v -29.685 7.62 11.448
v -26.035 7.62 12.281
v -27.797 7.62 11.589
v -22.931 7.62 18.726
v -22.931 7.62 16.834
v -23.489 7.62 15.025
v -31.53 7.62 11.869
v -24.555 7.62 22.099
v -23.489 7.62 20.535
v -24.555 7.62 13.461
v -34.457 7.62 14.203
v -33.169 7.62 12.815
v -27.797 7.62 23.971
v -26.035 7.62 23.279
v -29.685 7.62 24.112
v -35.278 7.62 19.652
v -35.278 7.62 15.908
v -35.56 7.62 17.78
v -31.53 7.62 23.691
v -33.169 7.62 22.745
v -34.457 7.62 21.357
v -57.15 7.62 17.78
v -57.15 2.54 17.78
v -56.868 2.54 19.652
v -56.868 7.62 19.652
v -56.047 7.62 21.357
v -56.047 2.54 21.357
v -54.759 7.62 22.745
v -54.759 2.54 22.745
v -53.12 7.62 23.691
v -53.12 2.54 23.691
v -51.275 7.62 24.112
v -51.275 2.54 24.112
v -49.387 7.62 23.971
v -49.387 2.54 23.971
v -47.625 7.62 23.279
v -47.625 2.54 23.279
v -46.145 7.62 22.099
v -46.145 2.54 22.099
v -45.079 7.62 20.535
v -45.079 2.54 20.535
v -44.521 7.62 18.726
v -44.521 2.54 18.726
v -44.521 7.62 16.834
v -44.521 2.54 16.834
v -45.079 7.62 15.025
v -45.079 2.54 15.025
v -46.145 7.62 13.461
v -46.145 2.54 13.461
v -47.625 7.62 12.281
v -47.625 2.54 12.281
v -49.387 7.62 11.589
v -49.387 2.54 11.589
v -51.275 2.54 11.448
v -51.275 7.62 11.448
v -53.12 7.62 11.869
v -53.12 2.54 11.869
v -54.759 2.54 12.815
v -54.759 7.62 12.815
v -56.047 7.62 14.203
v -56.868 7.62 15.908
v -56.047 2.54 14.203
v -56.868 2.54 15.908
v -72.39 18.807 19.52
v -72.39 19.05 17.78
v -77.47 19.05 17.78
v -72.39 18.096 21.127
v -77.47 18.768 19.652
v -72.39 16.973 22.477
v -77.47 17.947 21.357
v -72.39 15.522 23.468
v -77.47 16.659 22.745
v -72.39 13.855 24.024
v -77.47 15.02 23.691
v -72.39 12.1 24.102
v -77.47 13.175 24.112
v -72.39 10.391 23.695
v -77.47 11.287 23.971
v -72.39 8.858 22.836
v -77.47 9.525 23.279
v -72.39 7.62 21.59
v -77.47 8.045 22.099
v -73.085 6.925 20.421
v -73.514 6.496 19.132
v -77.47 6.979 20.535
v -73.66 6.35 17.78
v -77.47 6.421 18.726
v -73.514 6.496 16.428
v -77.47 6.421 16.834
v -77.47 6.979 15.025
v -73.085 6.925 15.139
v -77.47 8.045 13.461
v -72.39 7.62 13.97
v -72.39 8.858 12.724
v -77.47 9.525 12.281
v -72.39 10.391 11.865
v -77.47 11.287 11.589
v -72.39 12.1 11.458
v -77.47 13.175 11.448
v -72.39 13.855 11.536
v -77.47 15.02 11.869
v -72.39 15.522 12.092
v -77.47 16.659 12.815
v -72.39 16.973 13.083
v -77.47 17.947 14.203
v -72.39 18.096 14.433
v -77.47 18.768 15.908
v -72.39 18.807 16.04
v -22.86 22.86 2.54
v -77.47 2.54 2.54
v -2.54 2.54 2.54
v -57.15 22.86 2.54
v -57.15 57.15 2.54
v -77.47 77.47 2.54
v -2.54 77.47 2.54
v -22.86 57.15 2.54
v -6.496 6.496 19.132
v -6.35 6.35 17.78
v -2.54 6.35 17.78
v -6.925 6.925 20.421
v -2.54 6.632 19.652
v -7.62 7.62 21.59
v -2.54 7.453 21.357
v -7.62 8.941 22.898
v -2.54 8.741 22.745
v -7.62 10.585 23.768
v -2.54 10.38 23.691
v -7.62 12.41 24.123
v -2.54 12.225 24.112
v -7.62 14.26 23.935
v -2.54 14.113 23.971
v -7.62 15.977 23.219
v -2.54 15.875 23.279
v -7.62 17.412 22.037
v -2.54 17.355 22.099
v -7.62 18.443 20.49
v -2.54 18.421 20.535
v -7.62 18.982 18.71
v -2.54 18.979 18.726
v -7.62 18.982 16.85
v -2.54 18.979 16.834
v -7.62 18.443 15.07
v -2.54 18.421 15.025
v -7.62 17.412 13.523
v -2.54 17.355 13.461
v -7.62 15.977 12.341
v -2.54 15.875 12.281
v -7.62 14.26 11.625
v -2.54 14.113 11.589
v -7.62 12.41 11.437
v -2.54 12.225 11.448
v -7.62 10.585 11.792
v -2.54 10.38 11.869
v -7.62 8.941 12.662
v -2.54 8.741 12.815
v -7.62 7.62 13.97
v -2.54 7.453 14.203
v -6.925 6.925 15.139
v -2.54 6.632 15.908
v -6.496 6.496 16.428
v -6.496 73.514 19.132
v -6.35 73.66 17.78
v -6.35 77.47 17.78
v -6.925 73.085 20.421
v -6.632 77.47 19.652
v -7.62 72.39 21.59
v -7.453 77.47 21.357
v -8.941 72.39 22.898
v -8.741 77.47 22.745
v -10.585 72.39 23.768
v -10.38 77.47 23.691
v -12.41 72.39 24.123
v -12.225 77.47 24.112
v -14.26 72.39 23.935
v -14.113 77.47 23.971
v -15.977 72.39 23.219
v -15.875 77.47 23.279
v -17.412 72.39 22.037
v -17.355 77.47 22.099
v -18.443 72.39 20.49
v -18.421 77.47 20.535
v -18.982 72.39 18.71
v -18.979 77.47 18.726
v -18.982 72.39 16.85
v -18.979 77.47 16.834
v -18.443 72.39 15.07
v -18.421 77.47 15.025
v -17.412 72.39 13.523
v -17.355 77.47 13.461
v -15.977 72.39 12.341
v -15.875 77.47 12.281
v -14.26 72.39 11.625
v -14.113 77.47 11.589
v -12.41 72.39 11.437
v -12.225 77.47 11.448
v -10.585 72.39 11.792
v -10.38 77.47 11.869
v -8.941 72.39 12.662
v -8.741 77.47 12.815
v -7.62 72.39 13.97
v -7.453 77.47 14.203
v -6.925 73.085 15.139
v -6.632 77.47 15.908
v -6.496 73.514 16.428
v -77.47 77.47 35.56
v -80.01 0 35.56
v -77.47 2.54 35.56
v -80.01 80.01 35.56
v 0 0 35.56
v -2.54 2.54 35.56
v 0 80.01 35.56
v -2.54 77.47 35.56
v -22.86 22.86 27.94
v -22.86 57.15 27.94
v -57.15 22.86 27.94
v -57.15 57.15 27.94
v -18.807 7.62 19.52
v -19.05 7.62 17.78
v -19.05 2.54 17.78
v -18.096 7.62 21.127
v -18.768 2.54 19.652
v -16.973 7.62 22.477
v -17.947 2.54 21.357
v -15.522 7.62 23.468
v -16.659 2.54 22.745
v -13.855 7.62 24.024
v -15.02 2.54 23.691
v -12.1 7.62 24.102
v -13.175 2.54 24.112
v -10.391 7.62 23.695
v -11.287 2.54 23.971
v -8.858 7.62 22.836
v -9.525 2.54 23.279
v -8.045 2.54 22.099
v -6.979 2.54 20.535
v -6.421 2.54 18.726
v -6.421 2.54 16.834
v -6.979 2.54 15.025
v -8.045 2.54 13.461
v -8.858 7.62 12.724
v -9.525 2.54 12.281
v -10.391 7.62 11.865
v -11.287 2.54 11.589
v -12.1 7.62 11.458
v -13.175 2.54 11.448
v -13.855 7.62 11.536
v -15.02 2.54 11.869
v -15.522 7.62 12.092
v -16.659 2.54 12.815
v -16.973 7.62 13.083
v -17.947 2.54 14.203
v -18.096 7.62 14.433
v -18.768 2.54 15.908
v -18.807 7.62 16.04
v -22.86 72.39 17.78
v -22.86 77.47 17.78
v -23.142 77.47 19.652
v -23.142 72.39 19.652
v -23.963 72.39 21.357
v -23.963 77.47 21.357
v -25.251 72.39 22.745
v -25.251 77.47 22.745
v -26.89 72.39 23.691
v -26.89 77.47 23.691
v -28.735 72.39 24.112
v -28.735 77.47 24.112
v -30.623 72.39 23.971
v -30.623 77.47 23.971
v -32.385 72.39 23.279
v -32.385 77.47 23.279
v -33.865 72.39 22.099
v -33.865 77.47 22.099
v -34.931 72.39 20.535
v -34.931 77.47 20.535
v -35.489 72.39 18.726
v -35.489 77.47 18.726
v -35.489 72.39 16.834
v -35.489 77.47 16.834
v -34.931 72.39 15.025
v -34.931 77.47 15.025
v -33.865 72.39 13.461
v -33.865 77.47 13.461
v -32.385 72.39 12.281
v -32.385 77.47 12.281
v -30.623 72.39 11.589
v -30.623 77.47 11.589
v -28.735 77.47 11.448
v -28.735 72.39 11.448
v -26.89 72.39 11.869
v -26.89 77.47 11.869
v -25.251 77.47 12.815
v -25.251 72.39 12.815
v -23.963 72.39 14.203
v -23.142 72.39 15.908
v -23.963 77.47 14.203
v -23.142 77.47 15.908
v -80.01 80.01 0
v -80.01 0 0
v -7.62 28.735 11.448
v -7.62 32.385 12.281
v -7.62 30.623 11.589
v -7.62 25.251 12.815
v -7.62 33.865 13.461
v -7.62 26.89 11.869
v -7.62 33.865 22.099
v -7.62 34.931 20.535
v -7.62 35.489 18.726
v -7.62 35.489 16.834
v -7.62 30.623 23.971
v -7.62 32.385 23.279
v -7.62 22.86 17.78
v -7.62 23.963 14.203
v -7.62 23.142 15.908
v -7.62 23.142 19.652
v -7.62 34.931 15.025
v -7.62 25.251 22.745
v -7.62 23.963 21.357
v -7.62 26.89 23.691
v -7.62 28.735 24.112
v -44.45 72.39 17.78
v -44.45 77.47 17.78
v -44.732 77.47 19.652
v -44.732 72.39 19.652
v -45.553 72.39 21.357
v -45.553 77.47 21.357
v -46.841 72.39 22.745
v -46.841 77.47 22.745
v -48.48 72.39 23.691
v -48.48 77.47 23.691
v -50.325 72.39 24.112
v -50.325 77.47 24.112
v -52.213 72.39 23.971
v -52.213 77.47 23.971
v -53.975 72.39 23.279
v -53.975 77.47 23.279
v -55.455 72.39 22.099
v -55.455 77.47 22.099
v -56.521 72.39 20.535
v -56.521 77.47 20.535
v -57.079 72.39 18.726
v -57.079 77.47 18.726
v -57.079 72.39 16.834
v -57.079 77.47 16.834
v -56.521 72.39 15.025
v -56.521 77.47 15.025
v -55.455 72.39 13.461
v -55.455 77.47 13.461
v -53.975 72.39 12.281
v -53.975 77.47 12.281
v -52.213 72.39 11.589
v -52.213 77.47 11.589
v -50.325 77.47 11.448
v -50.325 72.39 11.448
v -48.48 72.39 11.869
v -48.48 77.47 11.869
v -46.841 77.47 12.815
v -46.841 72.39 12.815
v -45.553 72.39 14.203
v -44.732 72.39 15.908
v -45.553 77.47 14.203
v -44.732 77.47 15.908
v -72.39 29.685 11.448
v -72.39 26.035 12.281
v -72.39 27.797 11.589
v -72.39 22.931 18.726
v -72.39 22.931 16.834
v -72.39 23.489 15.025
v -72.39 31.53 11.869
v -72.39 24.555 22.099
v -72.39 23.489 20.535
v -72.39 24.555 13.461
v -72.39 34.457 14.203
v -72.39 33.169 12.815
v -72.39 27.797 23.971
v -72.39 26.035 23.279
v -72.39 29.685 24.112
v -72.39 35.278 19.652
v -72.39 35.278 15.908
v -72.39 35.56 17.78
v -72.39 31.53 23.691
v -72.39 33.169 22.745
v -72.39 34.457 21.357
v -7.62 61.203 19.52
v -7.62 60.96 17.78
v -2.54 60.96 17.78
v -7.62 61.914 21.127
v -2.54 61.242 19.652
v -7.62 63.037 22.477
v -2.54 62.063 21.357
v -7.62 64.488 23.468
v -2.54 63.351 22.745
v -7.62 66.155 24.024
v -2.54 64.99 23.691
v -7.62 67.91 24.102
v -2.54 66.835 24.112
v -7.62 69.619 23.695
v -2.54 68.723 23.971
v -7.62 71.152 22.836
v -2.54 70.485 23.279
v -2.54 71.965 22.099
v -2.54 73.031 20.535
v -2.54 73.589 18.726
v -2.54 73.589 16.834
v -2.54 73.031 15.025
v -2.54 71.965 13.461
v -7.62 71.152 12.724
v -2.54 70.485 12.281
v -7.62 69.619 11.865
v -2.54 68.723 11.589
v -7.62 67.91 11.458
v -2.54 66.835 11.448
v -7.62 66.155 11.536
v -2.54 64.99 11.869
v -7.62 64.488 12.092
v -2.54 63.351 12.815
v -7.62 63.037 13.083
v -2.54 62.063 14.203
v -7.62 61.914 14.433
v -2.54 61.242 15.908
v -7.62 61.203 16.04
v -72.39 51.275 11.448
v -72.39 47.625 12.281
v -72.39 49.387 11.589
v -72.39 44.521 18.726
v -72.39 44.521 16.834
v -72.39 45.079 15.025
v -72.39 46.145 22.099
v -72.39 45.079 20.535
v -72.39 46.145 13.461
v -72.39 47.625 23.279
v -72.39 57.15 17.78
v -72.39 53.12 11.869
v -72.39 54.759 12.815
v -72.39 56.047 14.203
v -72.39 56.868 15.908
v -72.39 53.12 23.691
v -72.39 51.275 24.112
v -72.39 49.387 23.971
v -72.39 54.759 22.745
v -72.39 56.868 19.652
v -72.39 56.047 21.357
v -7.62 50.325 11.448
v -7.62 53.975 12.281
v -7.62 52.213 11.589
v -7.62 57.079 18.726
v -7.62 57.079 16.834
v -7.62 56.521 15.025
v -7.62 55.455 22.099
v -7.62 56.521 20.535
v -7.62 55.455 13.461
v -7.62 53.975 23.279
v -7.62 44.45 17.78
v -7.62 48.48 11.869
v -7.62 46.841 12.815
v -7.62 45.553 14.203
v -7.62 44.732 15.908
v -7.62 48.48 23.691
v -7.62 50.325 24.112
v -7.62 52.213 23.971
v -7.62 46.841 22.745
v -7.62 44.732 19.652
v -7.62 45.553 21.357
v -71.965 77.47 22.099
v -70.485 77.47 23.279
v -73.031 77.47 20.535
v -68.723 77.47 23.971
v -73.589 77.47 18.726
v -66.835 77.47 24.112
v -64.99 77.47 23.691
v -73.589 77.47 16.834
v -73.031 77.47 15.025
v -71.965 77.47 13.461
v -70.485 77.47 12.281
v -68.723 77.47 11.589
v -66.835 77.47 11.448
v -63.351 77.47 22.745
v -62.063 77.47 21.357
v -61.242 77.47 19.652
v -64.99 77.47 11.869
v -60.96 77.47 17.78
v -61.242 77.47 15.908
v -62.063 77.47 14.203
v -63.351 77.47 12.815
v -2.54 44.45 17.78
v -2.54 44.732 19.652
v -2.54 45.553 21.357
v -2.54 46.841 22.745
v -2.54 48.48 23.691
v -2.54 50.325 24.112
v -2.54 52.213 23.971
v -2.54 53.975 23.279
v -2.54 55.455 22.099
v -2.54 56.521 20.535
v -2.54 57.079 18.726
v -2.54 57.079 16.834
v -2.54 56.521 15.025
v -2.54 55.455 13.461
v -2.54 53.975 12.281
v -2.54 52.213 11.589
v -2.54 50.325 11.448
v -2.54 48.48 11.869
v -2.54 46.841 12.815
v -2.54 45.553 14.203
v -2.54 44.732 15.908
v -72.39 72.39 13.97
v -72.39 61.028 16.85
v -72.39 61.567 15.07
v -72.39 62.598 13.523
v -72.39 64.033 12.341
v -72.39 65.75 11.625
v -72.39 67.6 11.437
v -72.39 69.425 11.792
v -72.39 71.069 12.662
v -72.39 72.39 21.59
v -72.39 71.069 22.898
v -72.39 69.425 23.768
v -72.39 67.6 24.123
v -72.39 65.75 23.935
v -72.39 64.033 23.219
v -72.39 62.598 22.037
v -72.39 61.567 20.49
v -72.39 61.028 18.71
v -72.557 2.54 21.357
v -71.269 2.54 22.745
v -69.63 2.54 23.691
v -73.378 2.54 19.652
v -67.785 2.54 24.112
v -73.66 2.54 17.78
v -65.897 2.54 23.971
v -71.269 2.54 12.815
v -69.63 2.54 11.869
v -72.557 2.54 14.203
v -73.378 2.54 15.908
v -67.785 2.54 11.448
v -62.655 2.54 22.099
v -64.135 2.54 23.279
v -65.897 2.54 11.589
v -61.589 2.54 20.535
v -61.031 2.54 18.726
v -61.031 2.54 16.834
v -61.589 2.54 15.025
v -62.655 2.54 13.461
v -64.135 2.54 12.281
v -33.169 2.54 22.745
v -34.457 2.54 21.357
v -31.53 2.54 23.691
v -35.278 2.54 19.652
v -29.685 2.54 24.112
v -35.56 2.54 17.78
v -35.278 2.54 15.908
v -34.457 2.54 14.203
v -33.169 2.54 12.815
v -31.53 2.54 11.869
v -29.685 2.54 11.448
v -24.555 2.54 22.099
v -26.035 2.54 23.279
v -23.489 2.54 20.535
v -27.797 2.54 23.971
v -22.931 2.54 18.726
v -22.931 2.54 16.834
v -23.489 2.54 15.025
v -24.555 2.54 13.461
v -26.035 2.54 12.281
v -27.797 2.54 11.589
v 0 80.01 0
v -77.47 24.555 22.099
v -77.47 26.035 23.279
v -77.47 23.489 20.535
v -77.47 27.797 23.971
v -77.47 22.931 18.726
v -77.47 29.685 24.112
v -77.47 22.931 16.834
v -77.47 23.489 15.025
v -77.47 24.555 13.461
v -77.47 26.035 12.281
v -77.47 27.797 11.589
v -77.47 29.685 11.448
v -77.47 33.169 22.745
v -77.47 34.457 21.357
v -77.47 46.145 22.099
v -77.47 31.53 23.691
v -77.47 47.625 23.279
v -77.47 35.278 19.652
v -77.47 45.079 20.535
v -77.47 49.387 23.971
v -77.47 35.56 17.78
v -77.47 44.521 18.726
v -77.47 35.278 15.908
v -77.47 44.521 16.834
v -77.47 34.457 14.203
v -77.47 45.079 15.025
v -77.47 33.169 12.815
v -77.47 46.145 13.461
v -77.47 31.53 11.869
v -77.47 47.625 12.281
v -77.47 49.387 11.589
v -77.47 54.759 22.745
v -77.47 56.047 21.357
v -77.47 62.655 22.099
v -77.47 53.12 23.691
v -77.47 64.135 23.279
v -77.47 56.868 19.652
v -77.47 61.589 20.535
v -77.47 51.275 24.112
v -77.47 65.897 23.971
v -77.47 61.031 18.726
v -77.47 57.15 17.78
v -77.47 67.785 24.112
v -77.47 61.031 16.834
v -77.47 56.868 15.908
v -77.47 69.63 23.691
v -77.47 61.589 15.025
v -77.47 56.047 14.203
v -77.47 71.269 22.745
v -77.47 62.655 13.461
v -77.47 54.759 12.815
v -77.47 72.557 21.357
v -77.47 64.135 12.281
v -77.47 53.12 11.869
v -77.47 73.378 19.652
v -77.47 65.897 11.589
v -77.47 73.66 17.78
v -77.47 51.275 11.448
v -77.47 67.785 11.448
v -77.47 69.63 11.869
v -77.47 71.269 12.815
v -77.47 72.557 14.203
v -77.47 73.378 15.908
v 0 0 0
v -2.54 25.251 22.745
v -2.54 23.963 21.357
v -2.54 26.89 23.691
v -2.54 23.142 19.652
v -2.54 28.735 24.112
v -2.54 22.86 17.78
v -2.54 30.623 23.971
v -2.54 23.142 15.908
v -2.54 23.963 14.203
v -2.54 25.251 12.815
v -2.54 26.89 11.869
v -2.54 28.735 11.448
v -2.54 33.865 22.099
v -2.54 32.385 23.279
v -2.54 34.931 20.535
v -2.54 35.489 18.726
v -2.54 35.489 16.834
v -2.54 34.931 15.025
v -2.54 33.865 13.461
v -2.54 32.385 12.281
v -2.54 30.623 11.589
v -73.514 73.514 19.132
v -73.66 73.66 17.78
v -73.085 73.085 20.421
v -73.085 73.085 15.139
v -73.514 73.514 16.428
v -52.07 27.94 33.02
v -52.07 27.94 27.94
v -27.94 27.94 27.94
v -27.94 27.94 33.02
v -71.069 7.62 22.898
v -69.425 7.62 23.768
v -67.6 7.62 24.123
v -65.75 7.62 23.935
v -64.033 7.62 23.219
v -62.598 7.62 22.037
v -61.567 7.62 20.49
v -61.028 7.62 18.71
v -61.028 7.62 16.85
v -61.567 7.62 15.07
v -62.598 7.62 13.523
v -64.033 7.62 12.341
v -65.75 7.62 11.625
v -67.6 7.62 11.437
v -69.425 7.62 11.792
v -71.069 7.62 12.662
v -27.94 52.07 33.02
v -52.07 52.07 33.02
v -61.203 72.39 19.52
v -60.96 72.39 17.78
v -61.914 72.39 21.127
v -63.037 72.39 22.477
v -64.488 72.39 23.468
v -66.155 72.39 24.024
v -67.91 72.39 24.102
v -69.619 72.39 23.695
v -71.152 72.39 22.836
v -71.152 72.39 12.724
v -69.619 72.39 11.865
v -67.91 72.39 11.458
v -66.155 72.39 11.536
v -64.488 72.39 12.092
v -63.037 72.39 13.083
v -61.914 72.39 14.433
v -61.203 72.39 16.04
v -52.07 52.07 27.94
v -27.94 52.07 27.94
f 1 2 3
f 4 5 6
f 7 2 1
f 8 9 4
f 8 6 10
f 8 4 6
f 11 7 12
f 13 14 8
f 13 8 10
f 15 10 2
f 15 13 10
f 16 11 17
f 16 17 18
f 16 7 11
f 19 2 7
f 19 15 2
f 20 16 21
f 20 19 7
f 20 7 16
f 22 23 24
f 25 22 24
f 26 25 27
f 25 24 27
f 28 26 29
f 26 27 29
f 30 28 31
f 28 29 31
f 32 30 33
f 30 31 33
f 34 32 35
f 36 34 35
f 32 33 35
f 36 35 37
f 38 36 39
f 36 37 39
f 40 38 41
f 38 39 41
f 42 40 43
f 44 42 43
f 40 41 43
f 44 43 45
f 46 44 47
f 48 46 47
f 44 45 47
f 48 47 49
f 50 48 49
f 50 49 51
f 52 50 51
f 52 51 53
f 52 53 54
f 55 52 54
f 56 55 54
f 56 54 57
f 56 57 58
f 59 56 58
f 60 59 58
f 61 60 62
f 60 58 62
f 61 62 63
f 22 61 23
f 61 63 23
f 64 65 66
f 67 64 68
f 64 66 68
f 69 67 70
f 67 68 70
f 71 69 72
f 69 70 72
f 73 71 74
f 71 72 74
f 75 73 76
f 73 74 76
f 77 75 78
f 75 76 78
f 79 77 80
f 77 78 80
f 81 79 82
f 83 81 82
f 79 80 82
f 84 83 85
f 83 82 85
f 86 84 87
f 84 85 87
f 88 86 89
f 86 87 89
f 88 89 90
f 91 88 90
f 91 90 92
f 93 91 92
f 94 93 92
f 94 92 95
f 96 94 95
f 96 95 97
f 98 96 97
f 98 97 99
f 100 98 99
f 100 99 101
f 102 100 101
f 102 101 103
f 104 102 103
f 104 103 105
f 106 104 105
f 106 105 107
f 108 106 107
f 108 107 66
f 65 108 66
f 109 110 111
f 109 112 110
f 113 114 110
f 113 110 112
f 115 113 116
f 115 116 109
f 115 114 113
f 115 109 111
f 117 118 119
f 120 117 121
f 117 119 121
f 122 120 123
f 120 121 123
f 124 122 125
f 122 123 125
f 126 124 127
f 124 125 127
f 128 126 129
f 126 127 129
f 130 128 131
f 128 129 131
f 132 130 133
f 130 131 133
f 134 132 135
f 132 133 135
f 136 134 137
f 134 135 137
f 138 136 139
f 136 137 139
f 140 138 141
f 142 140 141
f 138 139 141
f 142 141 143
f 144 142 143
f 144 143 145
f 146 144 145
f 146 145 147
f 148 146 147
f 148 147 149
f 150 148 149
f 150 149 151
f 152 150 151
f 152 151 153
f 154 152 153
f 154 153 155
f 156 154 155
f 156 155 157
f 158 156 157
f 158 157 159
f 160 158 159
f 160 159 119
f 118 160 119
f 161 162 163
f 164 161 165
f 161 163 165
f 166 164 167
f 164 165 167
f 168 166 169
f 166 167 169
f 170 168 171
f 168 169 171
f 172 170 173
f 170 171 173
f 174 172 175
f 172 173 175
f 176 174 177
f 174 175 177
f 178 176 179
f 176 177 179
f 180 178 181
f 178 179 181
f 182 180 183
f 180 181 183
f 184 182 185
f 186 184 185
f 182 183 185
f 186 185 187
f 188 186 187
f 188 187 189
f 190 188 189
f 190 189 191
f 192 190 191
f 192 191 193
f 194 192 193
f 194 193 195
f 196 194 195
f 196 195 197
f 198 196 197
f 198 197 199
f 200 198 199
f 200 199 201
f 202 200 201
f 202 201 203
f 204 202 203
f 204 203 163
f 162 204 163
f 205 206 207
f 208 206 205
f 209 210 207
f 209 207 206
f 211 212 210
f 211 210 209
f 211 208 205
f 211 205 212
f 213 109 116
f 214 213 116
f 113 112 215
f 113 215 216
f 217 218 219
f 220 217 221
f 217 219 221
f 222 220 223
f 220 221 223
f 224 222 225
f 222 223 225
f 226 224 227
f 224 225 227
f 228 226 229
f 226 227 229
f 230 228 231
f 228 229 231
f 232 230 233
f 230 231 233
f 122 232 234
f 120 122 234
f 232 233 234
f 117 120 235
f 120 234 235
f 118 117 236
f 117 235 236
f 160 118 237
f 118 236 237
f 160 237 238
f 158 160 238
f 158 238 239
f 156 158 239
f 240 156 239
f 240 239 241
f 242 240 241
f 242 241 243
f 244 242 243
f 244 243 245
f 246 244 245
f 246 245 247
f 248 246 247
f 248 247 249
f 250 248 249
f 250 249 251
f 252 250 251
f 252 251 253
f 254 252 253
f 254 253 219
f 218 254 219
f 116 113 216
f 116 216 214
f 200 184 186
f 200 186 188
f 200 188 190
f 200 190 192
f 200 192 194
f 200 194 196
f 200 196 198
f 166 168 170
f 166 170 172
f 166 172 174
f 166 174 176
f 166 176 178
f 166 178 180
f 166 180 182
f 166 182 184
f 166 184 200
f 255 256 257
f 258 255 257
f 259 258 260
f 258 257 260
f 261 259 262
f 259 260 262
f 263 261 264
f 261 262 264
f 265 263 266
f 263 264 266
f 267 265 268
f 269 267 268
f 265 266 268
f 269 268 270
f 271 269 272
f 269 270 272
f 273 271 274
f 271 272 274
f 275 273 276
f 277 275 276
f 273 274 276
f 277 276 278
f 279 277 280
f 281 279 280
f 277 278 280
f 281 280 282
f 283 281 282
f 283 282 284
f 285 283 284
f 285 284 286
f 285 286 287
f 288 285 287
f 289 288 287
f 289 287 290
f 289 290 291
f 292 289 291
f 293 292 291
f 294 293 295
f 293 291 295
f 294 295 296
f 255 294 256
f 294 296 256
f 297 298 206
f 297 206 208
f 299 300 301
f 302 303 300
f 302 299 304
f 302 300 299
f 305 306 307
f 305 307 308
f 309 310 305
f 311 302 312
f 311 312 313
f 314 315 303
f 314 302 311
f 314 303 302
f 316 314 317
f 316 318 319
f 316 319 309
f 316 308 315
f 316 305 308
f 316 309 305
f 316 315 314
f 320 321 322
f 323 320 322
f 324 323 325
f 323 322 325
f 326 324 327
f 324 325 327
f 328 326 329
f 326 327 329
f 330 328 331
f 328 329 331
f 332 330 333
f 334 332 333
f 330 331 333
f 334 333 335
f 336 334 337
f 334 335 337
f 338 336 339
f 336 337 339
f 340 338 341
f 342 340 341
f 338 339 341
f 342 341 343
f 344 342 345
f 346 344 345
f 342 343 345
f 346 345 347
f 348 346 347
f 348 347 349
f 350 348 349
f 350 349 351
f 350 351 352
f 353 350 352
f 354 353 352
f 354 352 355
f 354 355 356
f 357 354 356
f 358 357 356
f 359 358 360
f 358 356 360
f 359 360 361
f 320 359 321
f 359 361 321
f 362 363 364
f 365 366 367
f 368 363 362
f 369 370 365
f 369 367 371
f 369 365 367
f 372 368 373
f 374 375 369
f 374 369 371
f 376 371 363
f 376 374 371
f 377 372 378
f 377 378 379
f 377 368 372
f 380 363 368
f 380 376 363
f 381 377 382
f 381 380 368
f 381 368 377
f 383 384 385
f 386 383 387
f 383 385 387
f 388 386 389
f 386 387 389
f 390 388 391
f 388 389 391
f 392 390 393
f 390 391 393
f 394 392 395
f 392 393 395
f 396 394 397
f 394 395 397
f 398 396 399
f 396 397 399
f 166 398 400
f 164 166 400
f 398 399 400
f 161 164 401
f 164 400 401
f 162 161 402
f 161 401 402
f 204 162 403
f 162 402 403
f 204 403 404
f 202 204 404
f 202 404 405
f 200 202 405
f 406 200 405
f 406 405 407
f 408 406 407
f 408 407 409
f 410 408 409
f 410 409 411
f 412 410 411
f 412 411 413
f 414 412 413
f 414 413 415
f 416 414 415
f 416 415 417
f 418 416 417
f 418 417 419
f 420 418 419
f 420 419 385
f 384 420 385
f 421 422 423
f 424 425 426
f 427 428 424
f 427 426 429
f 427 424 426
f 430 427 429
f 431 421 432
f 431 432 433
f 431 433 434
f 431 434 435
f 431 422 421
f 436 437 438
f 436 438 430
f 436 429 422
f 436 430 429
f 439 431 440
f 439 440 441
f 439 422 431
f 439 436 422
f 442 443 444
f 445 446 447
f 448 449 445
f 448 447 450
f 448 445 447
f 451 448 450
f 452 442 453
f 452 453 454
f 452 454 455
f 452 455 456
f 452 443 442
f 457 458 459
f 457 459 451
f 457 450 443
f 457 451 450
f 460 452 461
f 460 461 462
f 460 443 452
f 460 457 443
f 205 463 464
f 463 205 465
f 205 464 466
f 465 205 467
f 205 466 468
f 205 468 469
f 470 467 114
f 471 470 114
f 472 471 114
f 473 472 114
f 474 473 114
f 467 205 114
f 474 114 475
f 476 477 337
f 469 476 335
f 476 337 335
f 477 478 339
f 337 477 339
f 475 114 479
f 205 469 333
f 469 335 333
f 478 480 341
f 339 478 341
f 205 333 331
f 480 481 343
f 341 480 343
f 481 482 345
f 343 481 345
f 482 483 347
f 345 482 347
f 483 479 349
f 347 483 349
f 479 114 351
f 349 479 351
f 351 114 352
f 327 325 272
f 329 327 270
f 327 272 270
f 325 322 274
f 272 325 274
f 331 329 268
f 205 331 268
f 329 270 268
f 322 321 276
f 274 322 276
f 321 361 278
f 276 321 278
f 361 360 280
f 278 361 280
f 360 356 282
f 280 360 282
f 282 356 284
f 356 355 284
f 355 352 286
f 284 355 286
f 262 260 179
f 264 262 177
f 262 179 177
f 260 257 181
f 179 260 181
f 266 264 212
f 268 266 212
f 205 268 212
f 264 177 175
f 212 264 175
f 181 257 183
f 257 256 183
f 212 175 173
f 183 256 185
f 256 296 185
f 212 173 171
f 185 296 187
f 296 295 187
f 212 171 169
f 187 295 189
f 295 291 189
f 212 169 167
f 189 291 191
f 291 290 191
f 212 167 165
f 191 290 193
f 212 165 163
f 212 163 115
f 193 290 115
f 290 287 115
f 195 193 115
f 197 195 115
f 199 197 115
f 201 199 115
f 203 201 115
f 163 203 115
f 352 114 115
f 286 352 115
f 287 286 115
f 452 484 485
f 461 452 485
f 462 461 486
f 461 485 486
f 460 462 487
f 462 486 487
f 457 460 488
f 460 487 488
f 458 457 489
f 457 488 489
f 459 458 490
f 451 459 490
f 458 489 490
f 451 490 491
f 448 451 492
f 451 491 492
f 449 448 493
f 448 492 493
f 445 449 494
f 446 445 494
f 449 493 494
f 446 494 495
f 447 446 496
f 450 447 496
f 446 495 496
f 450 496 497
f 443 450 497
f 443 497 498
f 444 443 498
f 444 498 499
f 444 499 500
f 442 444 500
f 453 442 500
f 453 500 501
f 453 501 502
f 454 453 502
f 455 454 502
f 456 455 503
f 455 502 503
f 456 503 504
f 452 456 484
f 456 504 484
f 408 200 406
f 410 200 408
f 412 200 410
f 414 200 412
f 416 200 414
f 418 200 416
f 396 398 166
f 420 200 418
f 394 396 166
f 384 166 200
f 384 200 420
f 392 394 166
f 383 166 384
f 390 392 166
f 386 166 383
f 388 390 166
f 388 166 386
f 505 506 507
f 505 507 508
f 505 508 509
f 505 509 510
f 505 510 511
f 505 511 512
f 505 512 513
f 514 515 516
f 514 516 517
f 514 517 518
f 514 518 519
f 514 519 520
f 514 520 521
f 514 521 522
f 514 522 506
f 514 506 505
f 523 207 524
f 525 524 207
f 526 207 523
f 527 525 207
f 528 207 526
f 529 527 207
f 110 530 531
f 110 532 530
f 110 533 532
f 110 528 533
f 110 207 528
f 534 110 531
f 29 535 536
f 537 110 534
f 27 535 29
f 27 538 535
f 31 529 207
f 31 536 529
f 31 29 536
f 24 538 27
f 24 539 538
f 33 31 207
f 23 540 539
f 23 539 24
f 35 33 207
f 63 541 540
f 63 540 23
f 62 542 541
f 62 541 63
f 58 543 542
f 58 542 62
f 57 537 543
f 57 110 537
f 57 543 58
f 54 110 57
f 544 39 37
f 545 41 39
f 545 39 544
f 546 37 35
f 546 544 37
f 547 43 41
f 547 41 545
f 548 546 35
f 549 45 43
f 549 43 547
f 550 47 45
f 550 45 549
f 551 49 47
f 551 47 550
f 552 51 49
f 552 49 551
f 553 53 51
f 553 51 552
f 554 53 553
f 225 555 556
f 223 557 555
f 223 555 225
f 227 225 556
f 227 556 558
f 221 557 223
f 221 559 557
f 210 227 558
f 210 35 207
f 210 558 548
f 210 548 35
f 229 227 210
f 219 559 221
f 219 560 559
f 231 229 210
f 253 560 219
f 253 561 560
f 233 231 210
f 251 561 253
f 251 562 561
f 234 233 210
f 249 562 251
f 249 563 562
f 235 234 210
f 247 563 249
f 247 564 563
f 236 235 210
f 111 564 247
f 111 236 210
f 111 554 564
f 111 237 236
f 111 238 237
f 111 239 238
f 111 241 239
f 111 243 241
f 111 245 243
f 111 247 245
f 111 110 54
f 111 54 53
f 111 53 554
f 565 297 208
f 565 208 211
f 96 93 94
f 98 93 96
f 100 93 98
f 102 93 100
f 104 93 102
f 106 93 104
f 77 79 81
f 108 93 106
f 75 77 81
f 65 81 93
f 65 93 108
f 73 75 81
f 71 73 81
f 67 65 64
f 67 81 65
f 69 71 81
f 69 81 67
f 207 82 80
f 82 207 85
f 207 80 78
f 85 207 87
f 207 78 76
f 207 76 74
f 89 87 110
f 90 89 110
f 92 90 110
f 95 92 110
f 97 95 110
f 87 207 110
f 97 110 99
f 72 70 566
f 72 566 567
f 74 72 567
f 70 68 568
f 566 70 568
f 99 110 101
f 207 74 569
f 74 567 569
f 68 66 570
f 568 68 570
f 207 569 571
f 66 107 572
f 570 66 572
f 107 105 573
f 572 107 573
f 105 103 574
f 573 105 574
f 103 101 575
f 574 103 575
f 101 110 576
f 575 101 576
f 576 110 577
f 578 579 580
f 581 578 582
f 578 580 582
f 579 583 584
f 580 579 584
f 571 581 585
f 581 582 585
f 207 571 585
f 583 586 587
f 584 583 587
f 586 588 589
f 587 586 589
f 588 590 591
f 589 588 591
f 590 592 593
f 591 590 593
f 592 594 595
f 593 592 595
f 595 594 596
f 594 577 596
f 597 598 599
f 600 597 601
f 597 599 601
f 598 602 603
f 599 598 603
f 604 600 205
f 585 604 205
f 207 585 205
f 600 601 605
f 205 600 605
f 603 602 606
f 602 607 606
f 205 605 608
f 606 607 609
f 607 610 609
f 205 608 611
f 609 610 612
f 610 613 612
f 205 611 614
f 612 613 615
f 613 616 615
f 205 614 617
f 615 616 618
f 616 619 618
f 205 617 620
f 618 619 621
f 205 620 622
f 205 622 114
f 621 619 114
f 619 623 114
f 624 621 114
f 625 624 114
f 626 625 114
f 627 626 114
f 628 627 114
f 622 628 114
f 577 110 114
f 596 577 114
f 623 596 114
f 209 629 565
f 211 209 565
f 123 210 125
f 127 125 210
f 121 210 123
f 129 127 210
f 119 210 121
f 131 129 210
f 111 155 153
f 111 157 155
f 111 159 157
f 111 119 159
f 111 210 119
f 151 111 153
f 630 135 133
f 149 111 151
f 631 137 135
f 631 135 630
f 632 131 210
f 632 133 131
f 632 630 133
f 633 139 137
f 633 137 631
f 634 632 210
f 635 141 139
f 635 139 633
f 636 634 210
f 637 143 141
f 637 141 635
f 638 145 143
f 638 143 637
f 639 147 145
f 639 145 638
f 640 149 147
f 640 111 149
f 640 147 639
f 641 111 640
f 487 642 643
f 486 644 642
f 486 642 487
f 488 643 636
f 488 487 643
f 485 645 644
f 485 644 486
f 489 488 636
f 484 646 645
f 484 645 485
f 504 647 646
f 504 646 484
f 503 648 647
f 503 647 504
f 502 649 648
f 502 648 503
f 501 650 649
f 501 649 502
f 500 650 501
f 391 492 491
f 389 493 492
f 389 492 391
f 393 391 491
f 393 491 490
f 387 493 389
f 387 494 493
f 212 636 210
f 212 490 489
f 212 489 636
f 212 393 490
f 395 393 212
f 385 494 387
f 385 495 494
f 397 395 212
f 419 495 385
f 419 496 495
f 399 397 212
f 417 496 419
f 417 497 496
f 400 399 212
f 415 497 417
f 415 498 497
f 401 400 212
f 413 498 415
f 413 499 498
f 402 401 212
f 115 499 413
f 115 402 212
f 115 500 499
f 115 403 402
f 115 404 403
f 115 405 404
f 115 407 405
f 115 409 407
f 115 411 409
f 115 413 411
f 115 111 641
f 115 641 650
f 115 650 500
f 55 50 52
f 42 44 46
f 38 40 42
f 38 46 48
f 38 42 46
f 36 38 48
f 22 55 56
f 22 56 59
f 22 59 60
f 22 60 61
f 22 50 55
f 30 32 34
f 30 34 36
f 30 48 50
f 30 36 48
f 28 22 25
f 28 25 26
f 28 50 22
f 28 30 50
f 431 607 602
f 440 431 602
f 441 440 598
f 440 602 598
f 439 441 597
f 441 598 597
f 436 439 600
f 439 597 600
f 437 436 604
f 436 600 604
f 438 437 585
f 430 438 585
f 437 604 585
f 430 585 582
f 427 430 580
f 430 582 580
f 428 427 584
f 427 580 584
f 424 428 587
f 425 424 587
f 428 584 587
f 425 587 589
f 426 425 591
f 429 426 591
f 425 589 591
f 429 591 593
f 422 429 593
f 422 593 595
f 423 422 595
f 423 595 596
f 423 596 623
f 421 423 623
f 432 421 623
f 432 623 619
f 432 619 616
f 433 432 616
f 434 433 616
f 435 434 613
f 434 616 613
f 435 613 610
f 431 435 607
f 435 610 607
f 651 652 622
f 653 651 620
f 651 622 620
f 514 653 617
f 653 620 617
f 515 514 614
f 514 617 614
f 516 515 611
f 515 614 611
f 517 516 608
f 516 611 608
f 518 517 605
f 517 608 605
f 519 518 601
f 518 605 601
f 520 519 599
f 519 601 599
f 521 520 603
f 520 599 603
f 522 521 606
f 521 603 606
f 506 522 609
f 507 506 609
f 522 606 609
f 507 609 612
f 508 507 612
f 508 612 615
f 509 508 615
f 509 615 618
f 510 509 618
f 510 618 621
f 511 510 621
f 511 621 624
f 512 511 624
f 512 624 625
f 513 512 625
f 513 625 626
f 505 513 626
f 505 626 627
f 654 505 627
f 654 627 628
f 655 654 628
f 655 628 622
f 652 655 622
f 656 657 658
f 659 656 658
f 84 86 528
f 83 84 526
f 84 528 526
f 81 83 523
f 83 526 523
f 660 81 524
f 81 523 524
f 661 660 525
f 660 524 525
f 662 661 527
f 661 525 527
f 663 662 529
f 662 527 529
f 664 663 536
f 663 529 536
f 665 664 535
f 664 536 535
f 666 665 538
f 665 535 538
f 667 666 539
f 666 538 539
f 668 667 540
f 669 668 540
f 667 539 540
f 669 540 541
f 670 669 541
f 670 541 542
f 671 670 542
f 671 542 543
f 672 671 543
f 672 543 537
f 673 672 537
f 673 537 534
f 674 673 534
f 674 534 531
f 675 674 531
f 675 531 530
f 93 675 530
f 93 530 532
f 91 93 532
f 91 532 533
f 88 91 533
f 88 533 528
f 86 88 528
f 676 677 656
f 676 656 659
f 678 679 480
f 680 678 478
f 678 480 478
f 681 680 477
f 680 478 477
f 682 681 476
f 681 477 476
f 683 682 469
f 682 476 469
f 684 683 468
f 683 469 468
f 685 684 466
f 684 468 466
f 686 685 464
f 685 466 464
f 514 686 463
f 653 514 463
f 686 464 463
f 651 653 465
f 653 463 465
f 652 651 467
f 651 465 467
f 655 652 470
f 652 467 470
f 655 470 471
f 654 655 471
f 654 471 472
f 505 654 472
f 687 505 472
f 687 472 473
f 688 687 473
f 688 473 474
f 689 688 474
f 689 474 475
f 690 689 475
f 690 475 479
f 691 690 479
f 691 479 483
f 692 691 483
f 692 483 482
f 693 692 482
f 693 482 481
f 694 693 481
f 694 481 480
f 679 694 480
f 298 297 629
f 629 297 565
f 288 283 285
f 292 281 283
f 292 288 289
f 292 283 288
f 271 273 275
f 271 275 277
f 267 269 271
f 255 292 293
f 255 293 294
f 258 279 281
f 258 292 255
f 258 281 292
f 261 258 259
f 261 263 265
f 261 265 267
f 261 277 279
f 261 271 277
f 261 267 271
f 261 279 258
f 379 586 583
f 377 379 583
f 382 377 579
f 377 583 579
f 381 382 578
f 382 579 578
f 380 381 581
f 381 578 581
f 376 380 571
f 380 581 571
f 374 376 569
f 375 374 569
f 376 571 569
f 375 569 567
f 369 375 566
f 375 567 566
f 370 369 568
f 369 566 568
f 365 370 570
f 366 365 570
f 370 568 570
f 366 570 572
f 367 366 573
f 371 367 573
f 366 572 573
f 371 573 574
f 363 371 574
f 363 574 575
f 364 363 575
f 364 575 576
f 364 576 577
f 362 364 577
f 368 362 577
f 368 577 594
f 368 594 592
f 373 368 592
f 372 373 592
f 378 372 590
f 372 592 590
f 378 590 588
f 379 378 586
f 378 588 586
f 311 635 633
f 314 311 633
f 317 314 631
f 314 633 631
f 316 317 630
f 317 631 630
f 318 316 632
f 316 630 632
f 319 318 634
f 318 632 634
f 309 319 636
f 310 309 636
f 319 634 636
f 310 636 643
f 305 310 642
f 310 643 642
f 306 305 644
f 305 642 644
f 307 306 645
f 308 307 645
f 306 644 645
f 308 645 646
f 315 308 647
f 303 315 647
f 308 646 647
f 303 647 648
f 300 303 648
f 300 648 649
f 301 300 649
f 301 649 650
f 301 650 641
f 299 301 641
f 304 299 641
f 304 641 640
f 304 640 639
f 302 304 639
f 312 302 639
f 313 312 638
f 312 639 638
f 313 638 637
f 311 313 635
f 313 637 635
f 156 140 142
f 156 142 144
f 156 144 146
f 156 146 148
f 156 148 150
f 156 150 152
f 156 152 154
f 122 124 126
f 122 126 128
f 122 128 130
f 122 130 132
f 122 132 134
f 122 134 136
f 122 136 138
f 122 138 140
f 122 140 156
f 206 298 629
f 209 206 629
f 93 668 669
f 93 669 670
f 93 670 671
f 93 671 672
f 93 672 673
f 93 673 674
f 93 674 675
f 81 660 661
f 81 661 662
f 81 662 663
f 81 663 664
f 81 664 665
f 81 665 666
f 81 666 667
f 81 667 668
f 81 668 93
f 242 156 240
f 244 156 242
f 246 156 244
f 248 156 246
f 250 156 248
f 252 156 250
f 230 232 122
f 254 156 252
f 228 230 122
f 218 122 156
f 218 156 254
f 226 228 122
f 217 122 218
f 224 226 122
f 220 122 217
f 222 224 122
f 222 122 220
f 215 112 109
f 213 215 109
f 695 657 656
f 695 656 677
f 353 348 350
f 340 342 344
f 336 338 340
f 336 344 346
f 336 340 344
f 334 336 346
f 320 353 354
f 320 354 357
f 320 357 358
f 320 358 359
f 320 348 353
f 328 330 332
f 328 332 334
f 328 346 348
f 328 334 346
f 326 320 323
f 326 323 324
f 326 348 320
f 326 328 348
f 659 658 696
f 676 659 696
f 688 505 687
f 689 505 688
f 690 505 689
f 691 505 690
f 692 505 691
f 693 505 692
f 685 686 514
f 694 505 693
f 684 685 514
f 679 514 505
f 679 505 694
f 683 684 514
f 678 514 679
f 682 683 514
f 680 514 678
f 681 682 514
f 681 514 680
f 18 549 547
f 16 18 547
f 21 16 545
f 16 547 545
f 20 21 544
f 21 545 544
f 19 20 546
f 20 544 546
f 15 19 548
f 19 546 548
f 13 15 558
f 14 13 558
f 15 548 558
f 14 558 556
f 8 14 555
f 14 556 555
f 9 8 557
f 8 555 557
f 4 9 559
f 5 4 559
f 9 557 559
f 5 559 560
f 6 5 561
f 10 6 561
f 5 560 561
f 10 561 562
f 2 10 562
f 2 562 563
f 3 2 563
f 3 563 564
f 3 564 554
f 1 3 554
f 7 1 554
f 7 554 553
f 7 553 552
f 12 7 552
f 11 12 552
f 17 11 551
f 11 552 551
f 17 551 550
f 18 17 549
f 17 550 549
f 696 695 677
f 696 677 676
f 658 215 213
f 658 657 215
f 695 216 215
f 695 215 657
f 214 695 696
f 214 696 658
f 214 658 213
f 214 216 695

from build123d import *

# Parameters (mm, degrees)
F0_W      = 80.01
F0_H      = 80.01
F0_W_2    = 69.85
F0_H_2    = 69.85
F1_DEPTH  = 35.56
F2_T      = -2.54
F3_W      = 34.29
F3_H      = 34.29
F3_W_2    = 24.13
F3_H_2    = 24.13
F4_DEPTH  = 25.4
F5_DEPTH  = 30.48
F6_R      = 6.35
F10_DEPTH = 5.08
F7_R      = 6.35
F11_DEPTH = 5.08
F9_R      = 6.35
F12_DEPTH = 5.08
F8_R      = 6.35
F13_DEPTH = 5.08


with BuildPart() as f1:
    # F0 (on Top) → F1 (new body)
    with BuildSketch(Plane.XY):
        with Locations((-40.005, 40.005)):
            Rectangle(F0_W, F0_H)
        with Locations((-40.005, 40.005)):
            Rectangle(F0_W_2, F0_H_2, mode=Mode.SUBTRACT)
        with Locations((-40.005, 40.005)):
            Rectangle(F0_W_2, F0_H_2)
    extrude(amount=F1_DEPTH)

    # F2
    f2_openings = [f1.faces().sort_by_distance(p)[0] for p in [
        (-40.005, 40.005, 35.56),
    ]]
    offset(amount=F2_T, openings=f2_openings)

    # F3 (on face) → F4 (join)
    with BuildSketch(Plane.XY.offset(2.54)):
        with Locations((-40.005, 40.005)):
            Rectangle(F3_W, F3_H)
        with Locations((-40.005, 40.005)):
            Rectangle(F3_W_2, F3_H_2, mode=Mode.SUBTRACT)
    extrude(amount=F4_DEPTH)

    # F5 (add): a face of the model
    f5_faces = [f1.faces().sort_by_distance(p)[0] for p in [
        (-40.005, 40.005, 2.54),
    ]]
    extrude(f5_faces, amount=F5_DEPTH)

    # F6 (on face) → F10 (join)
    with BuildSketch(Plane.XZ.offset(-77.47)):
        with Locations((-12.7, 17.78)):
            Circle(F6_R)
        with Locations((-29.21, 17.78)):
            Circle(F6_R)
        with Locations((-50.8, 17.78)):
            Circle(F6_R)
        with Locations((-67.31, 17.78)):
            Circle(F6_R)
    extrude(amount=F10_DEPTH)

    # F7 (on face) → F11 (join)
    with BuildSketch(Plane(origin=(-2.54, 0, 0), x_dir=(0, -1, 0), z_dir=(-1, 0, 0))):
        with Locations((-12.7, 17.78)):
            Circle(F7_R)
        with Locations((-29.21, 17.78)):
            Circle(F7_R)
        with Locations((-50.8, 17.78)):
            Circle(F7_R)
        with Locations((-67.31, 17.78)):
            Circle(F7_R)
    extrude(amount=F11_DEPTH)

    # F9 (on face) → F12 (join)
    with BuildSketch(Plane.YZ.offset(-77.47)):
        with Locations((67.31, 17.78)):
            Circle(F9_R)
        with Locations((50.8, 17.78)):
            Circle(F9_R)
        with Locations((29.21, 17.78)):
            Circle(F9_R)
        with Locations((12.7, 17.78)):
            Circle(F9_R)
    extrude(amount=F12_DEPTH)

    # F8 (on face) → F13 (join)
    with BuildSketch(Plane(origin=(0, 2.54, 0), x_dir=(-1, 0, 0), z_dir=(0, 1, 0))):
        with Locations((29.21, 17.78)):
            Circle(F8_R)
        with Locations((50.8, 17.78)):
            Circle(F8_R)
        with Locations((67.31, 17.78)):
            Circle(F8_R)
        with Locations((12.7, 17.78)):
            Circle(F8_R)
    extrude(amount=F13_DEPTH)


solid = f1.part
